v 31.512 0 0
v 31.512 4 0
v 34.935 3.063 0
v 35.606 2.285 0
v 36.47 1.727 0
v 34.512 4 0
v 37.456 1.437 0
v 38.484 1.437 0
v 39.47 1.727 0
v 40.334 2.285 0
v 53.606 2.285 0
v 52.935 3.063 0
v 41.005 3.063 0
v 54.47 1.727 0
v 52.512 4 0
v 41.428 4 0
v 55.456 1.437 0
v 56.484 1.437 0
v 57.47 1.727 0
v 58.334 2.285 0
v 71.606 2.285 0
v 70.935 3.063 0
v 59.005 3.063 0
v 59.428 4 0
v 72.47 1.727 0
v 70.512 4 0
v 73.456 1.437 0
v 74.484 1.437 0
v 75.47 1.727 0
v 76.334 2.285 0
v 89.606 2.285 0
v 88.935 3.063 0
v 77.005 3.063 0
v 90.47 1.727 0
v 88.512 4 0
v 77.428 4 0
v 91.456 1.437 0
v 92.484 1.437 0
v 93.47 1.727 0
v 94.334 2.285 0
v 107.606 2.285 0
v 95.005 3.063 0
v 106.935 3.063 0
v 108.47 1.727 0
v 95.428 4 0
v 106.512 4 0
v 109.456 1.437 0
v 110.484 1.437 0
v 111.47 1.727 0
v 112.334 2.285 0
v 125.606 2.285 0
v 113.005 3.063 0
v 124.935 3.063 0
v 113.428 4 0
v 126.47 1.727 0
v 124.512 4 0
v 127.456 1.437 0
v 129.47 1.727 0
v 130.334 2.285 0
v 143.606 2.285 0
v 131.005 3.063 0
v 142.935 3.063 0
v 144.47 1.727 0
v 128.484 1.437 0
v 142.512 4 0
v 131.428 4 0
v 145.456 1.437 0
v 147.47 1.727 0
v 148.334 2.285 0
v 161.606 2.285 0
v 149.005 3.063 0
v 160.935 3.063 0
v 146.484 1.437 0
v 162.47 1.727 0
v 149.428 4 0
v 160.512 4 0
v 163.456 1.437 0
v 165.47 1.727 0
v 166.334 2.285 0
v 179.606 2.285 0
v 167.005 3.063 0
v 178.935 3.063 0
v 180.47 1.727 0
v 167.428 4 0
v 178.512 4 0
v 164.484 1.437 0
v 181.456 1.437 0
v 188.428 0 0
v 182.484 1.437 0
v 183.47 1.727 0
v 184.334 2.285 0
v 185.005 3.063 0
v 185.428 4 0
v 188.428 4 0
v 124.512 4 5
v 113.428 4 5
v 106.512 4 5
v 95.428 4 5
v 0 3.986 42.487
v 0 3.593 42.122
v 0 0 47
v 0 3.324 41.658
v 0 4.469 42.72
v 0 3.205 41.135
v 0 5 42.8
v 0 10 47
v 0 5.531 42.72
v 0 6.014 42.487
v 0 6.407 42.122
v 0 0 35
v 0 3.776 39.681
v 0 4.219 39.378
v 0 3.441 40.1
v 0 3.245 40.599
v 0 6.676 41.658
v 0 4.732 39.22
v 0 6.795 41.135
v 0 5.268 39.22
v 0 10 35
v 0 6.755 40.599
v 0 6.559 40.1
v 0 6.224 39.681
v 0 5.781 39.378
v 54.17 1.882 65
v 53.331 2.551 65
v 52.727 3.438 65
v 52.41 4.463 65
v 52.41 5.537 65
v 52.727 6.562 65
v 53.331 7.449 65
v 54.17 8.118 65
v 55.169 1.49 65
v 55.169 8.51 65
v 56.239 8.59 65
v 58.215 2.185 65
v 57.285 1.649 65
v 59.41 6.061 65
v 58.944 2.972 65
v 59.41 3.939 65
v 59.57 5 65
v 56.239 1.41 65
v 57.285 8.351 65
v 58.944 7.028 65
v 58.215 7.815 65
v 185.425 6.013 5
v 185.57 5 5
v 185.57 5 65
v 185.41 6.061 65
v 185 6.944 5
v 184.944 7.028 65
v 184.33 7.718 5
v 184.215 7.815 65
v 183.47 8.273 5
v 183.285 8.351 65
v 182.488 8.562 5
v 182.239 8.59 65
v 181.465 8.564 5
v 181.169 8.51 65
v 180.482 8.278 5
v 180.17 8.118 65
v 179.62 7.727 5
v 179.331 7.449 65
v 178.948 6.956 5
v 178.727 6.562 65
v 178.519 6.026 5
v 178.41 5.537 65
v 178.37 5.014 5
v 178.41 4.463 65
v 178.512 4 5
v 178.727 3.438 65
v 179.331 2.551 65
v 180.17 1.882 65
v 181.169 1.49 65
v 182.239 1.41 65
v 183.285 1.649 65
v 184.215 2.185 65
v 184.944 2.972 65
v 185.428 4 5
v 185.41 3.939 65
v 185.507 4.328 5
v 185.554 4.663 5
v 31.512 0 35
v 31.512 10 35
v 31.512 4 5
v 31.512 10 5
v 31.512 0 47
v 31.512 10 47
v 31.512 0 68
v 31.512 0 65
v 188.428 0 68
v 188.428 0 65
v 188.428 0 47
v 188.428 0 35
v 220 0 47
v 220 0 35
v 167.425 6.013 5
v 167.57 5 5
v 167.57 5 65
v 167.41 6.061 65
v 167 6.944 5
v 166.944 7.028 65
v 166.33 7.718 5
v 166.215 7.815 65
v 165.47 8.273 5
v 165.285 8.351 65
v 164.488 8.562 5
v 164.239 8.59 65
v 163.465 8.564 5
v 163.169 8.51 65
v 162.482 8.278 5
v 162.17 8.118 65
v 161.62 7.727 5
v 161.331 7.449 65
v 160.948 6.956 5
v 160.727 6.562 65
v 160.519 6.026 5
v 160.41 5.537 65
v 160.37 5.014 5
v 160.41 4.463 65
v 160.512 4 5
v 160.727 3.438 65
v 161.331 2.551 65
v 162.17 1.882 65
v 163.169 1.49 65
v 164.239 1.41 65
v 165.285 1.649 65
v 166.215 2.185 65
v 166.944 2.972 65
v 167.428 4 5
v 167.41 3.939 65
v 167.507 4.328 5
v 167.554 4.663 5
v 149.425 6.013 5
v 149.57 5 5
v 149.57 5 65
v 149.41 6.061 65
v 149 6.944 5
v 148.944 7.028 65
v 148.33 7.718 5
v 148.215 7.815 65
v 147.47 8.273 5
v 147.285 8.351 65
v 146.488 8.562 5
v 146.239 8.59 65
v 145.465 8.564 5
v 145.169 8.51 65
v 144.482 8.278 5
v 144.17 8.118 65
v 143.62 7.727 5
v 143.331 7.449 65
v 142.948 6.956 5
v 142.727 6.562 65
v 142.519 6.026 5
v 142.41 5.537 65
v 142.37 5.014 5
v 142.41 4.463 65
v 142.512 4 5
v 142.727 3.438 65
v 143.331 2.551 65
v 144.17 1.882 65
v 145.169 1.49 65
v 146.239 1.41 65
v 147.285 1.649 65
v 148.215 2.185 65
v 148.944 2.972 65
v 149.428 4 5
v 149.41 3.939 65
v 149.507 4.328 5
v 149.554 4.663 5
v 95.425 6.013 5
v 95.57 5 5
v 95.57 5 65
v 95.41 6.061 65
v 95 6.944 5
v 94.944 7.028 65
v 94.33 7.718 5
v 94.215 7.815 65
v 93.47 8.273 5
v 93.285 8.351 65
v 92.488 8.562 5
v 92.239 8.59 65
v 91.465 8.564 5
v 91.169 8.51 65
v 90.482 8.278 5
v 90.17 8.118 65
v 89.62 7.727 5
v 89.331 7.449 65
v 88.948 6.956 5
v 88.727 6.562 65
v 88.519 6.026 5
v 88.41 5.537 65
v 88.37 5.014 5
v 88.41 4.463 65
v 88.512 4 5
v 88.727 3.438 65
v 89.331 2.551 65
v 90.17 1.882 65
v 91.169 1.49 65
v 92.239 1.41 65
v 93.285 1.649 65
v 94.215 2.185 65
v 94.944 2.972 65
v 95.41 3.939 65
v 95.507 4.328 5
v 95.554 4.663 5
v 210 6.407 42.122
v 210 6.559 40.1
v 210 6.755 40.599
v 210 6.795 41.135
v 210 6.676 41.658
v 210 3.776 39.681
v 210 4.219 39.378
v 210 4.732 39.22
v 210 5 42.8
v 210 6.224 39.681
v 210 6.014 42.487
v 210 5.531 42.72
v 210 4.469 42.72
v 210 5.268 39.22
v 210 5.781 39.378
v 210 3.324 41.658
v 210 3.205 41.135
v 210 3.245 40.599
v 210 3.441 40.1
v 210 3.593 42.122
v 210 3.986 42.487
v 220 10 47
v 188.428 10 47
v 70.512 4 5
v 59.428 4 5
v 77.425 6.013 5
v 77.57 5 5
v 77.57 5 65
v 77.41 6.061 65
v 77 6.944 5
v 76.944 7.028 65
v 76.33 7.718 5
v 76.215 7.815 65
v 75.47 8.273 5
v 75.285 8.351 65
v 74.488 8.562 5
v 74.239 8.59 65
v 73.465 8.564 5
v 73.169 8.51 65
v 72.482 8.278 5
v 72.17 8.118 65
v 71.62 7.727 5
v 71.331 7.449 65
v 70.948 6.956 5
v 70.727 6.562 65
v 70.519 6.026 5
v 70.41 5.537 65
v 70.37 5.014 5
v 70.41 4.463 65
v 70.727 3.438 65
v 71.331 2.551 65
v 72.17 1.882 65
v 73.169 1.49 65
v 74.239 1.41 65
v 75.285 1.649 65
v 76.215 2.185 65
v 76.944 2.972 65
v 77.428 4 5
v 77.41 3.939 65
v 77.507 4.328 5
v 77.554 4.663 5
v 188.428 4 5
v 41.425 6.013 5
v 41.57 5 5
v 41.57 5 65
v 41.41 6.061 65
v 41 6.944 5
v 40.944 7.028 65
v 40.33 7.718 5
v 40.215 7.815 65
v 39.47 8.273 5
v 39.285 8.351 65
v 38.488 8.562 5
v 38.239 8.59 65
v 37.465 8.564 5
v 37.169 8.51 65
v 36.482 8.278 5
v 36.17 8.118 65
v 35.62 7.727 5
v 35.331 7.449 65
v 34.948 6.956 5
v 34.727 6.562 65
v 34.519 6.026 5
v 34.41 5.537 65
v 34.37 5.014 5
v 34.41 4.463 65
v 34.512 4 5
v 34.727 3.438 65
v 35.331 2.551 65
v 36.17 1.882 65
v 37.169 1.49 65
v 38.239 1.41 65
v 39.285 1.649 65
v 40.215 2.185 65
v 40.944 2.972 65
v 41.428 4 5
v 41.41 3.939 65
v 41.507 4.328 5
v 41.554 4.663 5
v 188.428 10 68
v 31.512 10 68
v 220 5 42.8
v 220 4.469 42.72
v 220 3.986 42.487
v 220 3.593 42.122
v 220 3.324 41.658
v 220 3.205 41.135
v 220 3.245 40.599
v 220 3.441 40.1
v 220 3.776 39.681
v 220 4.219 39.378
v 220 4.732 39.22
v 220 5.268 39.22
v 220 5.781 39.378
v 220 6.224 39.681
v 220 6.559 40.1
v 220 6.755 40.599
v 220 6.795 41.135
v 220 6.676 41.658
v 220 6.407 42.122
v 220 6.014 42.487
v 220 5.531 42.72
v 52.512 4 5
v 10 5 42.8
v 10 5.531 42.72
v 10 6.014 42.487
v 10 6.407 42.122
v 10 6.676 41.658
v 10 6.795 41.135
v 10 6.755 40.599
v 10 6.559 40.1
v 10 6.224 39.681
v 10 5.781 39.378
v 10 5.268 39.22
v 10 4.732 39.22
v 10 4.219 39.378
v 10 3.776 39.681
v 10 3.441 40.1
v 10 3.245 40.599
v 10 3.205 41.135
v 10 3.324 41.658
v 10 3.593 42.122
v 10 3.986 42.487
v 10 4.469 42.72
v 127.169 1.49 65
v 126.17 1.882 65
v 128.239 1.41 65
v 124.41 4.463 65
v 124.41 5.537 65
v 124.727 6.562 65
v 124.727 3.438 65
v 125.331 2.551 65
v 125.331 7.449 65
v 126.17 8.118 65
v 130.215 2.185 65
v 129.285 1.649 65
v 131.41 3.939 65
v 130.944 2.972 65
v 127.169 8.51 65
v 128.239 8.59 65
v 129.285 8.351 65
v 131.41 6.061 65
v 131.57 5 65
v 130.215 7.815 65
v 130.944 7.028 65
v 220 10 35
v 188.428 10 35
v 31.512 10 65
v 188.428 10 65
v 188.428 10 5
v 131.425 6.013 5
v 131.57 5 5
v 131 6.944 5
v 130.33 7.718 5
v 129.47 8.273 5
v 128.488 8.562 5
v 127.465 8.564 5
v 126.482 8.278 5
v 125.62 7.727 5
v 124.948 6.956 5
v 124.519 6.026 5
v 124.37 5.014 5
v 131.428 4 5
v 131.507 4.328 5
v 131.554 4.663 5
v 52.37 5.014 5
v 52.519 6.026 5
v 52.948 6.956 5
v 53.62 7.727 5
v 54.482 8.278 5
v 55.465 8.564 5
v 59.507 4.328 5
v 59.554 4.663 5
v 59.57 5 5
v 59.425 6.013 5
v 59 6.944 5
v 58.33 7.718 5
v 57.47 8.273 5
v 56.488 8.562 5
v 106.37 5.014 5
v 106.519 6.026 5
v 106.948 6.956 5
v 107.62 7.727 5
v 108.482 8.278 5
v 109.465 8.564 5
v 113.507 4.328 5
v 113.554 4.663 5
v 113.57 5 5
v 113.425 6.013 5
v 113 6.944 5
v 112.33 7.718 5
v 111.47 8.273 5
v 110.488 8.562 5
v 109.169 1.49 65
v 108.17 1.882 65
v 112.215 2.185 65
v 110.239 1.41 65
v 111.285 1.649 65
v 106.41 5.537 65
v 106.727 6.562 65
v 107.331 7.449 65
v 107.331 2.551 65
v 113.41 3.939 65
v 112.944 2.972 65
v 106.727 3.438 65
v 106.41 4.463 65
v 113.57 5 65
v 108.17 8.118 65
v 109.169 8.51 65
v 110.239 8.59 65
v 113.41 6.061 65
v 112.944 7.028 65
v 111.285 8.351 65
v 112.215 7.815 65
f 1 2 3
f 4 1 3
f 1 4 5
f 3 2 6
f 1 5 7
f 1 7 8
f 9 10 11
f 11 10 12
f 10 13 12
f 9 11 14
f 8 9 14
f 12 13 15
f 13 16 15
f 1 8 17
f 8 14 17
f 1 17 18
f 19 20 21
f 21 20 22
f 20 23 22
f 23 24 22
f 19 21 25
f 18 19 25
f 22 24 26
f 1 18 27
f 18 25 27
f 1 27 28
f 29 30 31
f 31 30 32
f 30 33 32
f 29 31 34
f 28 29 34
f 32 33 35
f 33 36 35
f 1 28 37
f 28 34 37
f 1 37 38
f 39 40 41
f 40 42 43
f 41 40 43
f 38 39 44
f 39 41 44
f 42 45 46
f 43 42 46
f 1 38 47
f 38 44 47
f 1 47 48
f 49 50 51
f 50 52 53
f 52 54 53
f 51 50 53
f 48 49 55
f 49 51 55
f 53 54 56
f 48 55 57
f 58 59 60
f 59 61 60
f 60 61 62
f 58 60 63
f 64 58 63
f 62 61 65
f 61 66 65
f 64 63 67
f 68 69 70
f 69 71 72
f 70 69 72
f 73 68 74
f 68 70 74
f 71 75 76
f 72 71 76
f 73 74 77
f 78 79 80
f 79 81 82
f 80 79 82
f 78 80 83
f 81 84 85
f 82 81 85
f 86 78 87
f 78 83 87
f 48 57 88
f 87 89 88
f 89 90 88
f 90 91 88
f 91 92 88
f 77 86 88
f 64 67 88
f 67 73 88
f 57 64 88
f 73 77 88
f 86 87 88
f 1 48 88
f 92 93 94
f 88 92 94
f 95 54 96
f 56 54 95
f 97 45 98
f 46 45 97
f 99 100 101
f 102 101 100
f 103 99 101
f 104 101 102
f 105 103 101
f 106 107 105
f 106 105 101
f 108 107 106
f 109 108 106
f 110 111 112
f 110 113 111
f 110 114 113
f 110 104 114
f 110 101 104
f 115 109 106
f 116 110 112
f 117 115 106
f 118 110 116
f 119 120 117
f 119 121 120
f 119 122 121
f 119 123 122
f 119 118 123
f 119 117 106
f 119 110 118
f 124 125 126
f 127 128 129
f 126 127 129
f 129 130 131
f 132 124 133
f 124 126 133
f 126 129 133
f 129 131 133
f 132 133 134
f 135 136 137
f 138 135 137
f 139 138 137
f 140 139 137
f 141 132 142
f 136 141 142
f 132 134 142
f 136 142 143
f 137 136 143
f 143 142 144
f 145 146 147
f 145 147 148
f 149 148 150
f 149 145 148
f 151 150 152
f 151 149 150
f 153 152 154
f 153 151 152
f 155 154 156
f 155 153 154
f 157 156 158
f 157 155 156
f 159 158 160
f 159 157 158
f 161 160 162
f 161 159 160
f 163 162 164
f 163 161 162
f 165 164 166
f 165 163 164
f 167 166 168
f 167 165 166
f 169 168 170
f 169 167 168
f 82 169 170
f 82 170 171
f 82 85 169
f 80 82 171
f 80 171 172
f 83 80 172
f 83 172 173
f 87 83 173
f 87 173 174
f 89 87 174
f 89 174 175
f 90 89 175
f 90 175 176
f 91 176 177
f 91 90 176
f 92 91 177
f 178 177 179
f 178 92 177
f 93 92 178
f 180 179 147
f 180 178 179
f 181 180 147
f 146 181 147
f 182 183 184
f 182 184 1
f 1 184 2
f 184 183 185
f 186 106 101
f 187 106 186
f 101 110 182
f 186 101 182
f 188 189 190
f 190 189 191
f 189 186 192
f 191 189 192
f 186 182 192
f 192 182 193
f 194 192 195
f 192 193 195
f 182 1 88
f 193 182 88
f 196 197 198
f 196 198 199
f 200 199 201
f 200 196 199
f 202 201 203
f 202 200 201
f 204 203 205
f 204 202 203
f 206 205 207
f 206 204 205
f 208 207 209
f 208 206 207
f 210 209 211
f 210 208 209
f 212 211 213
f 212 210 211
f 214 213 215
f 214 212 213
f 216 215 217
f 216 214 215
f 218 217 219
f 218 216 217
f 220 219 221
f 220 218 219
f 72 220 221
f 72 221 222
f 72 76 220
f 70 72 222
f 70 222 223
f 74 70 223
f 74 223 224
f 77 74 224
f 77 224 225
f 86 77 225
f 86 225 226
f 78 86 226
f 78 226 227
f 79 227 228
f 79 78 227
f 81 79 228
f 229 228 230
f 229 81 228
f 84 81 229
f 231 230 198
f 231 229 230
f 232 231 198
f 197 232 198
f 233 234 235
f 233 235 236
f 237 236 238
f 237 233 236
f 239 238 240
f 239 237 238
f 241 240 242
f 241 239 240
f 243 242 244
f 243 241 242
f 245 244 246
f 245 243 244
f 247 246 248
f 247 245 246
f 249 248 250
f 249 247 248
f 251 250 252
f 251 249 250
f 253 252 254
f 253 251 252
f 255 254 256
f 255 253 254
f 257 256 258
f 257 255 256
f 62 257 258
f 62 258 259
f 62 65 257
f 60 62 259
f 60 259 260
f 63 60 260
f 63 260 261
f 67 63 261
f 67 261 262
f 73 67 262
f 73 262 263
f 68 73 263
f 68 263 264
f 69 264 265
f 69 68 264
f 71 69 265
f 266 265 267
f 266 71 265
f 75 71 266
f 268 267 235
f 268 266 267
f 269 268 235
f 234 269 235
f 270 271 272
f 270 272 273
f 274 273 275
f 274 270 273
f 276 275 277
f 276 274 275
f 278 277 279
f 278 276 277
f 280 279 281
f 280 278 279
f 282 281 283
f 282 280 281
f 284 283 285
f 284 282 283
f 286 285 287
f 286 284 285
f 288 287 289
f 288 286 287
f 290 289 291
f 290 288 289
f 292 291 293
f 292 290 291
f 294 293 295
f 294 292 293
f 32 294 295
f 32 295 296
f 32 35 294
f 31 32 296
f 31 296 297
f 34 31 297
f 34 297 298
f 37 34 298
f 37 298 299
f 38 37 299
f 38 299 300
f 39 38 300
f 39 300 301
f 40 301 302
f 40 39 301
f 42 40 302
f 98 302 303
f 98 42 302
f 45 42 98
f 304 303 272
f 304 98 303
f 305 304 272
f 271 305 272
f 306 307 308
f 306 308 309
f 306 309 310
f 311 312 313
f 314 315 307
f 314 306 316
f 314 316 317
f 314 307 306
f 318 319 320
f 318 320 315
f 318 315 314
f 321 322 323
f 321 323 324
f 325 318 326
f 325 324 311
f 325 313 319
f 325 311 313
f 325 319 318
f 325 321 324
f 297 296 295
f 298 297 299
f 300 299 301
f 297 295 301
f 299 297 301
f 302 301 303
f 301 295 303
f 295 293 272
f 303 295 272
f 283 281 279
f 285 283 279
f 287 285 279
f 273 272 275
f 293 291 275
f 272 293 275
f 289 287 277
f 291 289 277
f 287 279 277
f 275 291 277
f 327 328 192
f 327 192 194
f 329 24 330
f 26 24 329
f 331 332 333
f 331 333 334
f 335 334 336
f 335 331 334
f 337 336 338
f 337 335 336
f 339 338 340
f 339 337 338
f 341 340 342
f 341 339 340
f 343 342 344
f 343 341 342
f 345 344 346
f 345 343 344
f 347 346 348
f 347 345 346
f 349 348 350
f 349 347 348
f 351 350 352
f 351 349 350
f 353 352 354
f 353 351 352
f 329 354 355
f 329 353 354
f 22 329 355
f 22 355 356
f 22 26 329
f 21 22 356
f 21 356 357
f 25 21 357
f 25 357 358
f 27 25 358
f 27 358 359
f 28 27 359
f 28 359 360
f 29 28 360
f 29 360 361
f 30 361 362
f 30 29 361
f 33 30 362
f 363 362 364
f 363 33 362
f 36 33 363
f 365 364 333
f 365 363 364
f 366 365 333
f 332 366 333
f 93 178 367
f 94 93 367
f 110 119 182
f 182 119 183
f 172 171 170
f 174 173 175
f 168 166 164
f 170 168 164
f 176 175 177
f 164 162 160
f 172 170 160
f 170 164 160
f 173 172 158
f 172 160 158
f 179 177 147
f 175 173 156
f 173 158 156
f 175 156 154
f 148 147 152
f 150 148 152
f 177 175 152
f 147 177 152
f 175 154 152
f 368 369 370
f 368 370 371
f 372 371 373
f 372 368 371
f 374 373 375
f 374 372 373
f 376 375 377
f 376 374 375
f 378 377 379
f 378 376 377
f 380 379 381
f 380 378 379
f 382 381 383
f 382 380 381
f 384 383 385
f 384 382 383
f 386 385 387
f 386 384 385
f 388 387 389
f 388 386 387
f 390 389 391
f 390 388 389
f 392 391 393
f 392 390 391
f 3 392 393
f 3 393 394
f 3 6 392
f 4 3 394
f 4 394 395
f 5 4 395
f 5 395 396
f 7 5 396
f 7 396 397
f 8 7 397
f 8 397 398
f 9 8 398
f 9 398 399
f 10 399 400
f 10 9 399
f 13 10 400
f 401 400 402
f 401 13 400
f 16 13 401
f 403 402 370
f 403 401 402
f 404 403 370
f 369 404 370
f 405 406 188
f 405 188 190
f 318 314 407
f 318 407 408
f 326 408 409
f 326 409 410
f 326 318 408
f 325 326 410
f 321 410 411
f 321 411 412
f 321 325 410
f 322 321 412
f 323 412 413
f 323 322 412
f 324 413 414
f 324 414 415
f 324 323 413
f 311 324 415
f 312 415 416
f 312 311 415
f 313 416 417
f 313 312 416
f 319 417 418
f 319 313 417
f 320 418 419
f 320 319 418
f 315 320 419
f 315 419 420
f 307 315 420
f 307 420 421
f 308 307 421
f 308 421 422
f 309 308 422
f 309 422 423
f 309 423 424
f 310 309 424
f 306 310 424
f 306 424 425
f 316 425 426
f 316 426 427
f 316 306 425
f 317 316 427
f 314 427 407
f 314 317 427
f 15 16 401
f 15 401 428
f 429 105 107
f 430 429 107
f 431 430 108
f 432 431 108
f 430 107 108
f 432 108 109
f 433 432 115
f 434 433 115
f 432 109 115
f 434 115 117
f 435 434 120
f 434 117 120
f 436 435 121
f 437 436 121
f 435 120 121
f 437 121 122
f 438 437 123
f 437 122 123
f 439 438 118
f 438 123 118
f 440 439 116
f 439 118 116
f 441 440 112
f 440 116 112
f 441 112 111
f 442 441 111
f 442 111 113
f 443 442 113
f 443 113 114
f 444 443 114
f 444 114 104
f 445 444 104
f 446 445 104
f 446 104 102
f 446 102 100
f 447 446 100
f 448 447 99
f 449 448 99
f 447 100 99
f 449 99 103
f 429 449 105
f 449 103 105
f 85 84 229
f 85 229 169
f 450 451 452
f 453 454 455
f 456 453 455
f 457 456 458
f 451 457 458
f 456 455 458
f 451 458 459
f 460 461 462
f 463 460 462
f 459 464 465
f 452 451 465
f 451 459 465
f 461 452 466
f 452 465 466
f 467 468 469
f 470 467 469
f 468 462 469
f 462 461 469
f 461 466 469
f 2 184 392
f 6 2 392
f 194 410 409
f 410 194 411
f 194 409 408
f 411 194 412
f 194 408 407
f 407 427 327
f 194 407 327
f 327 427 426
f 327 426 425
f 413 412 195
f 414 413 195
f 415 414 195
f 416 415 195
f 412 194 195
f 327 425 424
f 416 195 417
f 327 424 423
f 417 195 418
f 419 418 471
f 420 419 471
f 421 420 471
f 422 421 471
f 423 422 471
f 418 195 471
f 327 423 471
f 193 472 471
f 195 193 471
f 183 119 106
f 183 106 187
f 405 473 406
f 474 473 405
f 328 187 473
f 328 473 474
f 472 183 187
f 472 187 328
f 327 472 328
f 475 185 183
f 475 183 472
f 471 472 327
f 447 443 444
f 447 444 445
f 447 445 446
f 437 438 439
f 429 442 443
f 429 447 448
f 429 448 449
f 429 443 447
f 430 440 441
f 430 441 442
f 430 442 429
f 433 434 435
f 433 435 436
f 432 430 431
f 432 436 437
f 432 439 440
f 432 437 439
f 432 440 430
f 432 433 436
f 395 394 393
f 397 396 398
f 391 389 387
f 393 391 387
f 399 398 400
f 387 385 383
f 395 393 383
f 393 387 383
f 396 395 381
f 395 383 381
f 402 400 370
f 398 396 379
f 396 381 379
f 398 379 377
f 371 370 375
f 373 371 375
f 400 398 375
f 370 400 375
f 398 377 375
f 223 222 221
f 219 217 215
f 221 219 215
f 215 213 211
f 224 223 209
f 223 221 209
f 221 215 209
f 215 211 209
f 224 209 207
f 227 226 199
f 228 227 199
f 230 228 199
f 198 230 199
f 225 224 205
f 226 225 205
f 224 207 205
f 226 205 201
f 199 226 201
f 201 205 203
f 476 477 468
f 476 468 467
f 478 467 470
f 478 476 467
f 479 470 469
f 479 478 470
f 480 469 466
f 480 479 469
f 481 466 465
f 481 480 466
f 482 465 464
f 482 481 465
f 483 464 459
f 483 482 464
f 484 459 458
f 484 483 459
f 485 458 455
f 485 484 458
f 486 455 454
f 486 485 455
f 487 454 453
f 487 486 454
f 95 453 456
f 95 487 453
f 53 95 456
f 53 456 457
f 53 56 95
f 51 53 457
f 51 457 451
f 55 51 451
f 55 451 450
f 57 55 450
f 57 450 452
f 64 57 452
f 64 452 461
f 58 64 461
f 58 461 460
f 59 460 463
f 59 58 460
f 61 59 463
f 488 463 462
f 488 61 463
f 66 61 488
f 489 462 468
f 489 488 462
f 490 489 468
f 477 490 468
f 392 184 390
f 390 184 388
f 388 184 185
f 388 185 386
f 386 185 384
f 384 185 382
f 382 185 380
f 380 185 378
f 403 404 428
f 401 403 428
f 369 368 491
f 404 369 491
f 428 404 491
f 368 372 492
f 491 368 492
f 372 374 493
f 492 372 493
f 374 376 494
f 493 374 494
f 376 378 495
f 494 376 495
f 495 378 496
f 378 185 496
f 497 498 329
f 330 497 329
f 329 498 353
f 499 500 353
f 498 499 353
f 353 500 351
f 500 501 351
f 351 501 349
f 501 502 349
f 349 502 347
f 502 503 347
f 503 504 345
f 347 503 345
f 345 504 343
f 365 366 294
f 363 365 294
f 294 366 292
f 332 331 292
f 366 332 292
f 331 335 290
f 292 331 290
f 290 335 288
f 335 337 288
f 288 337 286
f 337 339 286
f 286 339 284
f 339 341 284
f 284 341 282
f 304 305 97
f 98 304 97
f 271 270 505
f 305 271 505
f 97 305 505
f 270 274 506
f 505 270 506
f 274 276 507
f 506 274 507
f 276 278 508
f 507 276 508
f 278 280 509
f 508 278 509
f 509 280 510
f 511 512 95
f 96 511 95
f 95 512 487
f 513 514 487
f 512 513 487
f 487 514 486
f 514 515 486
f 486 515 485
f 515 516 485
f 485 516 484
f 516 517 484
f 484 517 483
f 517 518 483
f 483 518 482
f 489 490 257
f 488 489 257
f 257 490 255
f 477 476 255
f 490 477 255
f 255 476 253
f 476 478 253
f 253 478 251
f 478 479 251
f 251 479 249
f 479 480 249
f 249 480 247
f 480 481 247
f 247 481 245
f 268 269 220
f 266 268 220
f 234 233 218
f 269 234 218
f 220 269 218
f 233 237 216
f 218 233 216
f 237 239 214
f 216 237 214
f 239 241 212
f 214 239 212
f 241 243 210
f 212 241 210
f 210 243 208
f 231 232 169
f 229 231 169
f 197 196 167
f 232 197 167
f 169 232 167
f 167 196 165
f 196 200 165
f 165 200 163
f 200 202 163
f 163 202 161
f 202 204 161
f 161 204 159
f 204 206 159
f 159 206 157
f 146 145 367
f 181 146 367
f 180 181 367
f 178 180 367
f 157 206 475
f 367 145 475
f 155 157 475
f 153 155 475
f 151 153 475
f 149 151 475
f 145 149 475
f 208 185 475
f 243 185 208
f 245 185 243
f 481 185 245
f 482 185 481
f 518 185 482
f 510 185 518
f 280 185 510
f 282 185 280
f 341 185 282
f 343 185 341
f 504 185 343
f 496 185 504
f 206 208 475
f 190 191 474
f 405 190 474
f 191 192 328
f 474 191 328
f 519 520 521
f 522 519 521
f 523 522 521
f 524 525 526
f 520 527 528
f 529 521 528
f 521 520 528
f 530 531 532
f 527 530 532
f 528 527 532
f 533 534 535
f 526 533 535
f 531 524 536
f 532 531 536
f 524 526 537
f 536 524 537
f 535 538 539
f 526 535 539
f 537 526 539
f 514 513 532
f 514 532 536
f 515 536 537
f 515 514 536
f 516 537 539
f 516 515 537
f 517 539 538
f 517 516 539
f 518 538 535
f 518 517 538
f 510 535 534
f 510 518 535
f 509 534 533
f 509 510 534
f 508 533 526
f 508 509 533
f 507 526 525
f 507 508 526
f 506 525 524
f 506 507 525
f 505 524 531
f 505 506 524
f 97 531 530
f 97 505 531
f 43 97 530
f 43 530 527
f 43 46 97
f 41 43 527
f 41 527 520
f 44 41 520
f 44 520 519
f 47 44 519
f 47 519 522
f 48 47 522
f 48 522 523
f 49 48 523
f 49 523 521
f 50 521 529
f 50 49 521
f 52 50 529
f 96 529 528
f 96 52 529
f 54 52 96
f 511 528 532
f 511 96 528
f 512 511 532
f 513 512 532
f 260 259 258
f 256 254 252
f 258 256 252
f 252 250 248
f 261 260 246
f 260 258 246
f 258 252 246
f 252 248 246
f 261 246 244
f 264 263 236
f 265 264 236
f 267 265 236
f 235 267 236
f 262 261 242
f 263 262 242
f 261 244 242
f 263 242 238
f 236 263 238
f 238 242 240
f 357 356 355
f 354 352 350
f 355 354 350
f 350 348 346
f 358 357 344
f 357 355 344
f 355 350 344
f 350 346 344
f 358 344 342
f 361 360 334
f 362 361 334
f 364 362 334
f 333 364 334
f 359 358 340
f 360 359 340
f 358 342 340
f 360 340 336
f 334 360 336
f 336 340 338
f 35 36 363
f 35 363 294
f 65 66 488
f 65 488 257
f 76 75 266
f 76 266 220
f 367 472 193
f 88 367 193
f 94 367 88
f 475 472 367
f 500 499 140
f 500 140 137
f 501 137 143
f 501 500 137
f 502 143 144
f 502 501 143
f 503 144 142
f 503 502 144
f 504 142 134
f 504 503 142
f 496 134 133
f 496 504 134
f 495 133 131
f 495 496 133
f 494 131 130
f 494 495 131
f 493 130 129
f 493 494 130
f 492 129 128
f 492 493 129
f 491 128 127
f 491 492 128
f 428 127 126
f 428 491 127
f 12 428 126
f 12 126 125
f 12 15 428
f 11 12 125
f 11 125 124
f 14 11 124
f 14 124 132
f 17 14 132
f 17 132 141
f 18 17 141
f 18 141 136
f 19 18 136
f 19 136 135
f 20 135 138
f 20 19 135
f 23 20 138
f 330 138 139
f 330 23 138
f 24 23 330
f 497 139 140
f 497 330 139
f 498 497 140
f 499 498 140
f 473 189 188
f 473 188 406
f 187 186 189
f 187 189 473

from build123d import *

# Parameters (mm, degrees)
SKETCH_1_W          = 220
SKETCH_1_H          = 10
SKETCH_1_R          = 3.6
EXTRUDE_1_DEPTH     = 65
SKETCH_2_W          = 220
SKETCH_2_H          = 5
CUT_EXTRUDE_1_DEPTH = 6
SKETCH_3_W          = 31.511676707
SKETCH_3_H          = 35
SKETCH_3_H_2        = 18
SKETCH_3_W_2        = 31.571676707
CUT_EXTRUDE_2_DEPTH = 230.619250064
SKETCH_4_R          = 1.8
CUT_EXTRUDE_3_DEPTH = 10
CUT_EXTRUDE_START   = -10
SKETCH_5_R          = 1.8
CUT_EXTRUDE_4_DEPTH = 10
SKETCH_6_W          = 156.916646586
SKETCH_6_H          = 10
EXTRUDE_2_DEPTH     = 3


with BuildPart() as part:
    # Эскиз1 → Бобышка-Вытянуть1 (new body)
    with BuildSketch(Plane.XY):
        with Locations((110, 5)):
            Rectangle(SKETCH_1_W, SKETCH_1_H)
        with Locations((37.97, 5)):
            Circle(SKETCH_1_R, mode=Mode.SUBTRACT)
        with Locations((55.97, 5)):
            Circle(SKETCH_1_R, mode=Mode.SUBTRACT)
        with Locations((73.97, 5)):
            Circle(SKETCH_1_R, mode=Mode.SUBTRACT)
        with Locations((91.97, 5)):
            Circle(SKETCH_1_R, mode=Mode.SUBTRACT)
        with Locations((109.97, 5)):
            Circle(SKETCH_1_R, mode=Mode.SUBTRACT)
        with Locations((127.97, 5)):
            Circle(SKETCH_1_R, mode=Mode.SUBTRACT)
        with Locations((145.97, 5)):
            Circle(SKETCH_1_R, mode=Mode.SUBTRACT)
        with Locations((163.97, 5)):
            Circle(SKETCH_1_R, mode=Mode.SUBTRACT)
        with Locations((181.97, 5)):
            Circle(SKETCH_1_R, mode=Mode.SUBTRACT)
    extrude(amount=EXTRUDE_1_DEPTH)

    # Эскиз2 → Вырез-Вытянуть1 (cut)
    with BuildSketch(Plane(origin=(0, 10, 0), x_dir=(1, 0, 0), z_dir=(0, 1, 0))):
        with Locations((110, -2.5)):
            Rectangle(SKETCH_2_W, SKETCH_2_H)
    extrude(amount=-CUT_EXTRUDE_1_DEPTH, mode=Mode.SUBTRACT)

    # Эскиз3 → Вырез-Вытянуть2 (cut, through all)
    with BuildSketch(Plane(origin=(0, 10, 0), x_dir=(1, 0, 0), z_dir=(0, 1, 0))):
        with Locations((15.755838354, -17.5)):
            Rectangle(SKETCH_3_W, SKETCH_3_H)
        with Locations((15.755838354, -56)):
            Rectangle(SKETCH_3_W, SKETCH_3_H_2)
        with Locations((204.214161647, -17.5)):
            Rectangle(SKETCH_3_W_2, SKETCH_3_H)
        with Locations((204.214161647, -56)):
            Rectangle(SKETCH_3_W_2, SKETCH_3_H_2)
    extrude(amount=-CUT_EXTRUDE_2_DEPTH, mode=Mode.SUBTRACT)

    # Эскиз4 → Вырез-Вытянуть3 (cut)
    with BuildSketch(Plane.ZY):
        with Locations((41, 5)):
            Circle(SKETCH_4_R)
    extrude(amount=-CUT_EXTRUDE_3_DEPTH, mode=Mode.SUBTRACT)

    # Эскиз5 → Вырез-Вытянуть4 (cut)
    with BuildSketch(Plane(origin=(220, 0, 0), x_dir=(0, 0, -1), z_dir=(1, 0, 0)).offset(CUT_EXTRUDE_START)):
        with Locations(Location((-41, 5, 0), (0, 0, 180))):
            Circle(SKETCH_5_R)
    extrude(amount=CUT_EXTRUDE_4_DEPTH, mode=Mode.SUBTRACT)

    # Эскиз6 → Бобышка-Вытянуть2 (add)
    with BuildSketch(Plane.XY.offset(65)):
        with Locations((109.97, 5)):
            Rectangle(SKETCH_6_W, SKETCH_6_H)
    extrude(amount=EXTRUDE_2_DEPTH)


solid = part.part
